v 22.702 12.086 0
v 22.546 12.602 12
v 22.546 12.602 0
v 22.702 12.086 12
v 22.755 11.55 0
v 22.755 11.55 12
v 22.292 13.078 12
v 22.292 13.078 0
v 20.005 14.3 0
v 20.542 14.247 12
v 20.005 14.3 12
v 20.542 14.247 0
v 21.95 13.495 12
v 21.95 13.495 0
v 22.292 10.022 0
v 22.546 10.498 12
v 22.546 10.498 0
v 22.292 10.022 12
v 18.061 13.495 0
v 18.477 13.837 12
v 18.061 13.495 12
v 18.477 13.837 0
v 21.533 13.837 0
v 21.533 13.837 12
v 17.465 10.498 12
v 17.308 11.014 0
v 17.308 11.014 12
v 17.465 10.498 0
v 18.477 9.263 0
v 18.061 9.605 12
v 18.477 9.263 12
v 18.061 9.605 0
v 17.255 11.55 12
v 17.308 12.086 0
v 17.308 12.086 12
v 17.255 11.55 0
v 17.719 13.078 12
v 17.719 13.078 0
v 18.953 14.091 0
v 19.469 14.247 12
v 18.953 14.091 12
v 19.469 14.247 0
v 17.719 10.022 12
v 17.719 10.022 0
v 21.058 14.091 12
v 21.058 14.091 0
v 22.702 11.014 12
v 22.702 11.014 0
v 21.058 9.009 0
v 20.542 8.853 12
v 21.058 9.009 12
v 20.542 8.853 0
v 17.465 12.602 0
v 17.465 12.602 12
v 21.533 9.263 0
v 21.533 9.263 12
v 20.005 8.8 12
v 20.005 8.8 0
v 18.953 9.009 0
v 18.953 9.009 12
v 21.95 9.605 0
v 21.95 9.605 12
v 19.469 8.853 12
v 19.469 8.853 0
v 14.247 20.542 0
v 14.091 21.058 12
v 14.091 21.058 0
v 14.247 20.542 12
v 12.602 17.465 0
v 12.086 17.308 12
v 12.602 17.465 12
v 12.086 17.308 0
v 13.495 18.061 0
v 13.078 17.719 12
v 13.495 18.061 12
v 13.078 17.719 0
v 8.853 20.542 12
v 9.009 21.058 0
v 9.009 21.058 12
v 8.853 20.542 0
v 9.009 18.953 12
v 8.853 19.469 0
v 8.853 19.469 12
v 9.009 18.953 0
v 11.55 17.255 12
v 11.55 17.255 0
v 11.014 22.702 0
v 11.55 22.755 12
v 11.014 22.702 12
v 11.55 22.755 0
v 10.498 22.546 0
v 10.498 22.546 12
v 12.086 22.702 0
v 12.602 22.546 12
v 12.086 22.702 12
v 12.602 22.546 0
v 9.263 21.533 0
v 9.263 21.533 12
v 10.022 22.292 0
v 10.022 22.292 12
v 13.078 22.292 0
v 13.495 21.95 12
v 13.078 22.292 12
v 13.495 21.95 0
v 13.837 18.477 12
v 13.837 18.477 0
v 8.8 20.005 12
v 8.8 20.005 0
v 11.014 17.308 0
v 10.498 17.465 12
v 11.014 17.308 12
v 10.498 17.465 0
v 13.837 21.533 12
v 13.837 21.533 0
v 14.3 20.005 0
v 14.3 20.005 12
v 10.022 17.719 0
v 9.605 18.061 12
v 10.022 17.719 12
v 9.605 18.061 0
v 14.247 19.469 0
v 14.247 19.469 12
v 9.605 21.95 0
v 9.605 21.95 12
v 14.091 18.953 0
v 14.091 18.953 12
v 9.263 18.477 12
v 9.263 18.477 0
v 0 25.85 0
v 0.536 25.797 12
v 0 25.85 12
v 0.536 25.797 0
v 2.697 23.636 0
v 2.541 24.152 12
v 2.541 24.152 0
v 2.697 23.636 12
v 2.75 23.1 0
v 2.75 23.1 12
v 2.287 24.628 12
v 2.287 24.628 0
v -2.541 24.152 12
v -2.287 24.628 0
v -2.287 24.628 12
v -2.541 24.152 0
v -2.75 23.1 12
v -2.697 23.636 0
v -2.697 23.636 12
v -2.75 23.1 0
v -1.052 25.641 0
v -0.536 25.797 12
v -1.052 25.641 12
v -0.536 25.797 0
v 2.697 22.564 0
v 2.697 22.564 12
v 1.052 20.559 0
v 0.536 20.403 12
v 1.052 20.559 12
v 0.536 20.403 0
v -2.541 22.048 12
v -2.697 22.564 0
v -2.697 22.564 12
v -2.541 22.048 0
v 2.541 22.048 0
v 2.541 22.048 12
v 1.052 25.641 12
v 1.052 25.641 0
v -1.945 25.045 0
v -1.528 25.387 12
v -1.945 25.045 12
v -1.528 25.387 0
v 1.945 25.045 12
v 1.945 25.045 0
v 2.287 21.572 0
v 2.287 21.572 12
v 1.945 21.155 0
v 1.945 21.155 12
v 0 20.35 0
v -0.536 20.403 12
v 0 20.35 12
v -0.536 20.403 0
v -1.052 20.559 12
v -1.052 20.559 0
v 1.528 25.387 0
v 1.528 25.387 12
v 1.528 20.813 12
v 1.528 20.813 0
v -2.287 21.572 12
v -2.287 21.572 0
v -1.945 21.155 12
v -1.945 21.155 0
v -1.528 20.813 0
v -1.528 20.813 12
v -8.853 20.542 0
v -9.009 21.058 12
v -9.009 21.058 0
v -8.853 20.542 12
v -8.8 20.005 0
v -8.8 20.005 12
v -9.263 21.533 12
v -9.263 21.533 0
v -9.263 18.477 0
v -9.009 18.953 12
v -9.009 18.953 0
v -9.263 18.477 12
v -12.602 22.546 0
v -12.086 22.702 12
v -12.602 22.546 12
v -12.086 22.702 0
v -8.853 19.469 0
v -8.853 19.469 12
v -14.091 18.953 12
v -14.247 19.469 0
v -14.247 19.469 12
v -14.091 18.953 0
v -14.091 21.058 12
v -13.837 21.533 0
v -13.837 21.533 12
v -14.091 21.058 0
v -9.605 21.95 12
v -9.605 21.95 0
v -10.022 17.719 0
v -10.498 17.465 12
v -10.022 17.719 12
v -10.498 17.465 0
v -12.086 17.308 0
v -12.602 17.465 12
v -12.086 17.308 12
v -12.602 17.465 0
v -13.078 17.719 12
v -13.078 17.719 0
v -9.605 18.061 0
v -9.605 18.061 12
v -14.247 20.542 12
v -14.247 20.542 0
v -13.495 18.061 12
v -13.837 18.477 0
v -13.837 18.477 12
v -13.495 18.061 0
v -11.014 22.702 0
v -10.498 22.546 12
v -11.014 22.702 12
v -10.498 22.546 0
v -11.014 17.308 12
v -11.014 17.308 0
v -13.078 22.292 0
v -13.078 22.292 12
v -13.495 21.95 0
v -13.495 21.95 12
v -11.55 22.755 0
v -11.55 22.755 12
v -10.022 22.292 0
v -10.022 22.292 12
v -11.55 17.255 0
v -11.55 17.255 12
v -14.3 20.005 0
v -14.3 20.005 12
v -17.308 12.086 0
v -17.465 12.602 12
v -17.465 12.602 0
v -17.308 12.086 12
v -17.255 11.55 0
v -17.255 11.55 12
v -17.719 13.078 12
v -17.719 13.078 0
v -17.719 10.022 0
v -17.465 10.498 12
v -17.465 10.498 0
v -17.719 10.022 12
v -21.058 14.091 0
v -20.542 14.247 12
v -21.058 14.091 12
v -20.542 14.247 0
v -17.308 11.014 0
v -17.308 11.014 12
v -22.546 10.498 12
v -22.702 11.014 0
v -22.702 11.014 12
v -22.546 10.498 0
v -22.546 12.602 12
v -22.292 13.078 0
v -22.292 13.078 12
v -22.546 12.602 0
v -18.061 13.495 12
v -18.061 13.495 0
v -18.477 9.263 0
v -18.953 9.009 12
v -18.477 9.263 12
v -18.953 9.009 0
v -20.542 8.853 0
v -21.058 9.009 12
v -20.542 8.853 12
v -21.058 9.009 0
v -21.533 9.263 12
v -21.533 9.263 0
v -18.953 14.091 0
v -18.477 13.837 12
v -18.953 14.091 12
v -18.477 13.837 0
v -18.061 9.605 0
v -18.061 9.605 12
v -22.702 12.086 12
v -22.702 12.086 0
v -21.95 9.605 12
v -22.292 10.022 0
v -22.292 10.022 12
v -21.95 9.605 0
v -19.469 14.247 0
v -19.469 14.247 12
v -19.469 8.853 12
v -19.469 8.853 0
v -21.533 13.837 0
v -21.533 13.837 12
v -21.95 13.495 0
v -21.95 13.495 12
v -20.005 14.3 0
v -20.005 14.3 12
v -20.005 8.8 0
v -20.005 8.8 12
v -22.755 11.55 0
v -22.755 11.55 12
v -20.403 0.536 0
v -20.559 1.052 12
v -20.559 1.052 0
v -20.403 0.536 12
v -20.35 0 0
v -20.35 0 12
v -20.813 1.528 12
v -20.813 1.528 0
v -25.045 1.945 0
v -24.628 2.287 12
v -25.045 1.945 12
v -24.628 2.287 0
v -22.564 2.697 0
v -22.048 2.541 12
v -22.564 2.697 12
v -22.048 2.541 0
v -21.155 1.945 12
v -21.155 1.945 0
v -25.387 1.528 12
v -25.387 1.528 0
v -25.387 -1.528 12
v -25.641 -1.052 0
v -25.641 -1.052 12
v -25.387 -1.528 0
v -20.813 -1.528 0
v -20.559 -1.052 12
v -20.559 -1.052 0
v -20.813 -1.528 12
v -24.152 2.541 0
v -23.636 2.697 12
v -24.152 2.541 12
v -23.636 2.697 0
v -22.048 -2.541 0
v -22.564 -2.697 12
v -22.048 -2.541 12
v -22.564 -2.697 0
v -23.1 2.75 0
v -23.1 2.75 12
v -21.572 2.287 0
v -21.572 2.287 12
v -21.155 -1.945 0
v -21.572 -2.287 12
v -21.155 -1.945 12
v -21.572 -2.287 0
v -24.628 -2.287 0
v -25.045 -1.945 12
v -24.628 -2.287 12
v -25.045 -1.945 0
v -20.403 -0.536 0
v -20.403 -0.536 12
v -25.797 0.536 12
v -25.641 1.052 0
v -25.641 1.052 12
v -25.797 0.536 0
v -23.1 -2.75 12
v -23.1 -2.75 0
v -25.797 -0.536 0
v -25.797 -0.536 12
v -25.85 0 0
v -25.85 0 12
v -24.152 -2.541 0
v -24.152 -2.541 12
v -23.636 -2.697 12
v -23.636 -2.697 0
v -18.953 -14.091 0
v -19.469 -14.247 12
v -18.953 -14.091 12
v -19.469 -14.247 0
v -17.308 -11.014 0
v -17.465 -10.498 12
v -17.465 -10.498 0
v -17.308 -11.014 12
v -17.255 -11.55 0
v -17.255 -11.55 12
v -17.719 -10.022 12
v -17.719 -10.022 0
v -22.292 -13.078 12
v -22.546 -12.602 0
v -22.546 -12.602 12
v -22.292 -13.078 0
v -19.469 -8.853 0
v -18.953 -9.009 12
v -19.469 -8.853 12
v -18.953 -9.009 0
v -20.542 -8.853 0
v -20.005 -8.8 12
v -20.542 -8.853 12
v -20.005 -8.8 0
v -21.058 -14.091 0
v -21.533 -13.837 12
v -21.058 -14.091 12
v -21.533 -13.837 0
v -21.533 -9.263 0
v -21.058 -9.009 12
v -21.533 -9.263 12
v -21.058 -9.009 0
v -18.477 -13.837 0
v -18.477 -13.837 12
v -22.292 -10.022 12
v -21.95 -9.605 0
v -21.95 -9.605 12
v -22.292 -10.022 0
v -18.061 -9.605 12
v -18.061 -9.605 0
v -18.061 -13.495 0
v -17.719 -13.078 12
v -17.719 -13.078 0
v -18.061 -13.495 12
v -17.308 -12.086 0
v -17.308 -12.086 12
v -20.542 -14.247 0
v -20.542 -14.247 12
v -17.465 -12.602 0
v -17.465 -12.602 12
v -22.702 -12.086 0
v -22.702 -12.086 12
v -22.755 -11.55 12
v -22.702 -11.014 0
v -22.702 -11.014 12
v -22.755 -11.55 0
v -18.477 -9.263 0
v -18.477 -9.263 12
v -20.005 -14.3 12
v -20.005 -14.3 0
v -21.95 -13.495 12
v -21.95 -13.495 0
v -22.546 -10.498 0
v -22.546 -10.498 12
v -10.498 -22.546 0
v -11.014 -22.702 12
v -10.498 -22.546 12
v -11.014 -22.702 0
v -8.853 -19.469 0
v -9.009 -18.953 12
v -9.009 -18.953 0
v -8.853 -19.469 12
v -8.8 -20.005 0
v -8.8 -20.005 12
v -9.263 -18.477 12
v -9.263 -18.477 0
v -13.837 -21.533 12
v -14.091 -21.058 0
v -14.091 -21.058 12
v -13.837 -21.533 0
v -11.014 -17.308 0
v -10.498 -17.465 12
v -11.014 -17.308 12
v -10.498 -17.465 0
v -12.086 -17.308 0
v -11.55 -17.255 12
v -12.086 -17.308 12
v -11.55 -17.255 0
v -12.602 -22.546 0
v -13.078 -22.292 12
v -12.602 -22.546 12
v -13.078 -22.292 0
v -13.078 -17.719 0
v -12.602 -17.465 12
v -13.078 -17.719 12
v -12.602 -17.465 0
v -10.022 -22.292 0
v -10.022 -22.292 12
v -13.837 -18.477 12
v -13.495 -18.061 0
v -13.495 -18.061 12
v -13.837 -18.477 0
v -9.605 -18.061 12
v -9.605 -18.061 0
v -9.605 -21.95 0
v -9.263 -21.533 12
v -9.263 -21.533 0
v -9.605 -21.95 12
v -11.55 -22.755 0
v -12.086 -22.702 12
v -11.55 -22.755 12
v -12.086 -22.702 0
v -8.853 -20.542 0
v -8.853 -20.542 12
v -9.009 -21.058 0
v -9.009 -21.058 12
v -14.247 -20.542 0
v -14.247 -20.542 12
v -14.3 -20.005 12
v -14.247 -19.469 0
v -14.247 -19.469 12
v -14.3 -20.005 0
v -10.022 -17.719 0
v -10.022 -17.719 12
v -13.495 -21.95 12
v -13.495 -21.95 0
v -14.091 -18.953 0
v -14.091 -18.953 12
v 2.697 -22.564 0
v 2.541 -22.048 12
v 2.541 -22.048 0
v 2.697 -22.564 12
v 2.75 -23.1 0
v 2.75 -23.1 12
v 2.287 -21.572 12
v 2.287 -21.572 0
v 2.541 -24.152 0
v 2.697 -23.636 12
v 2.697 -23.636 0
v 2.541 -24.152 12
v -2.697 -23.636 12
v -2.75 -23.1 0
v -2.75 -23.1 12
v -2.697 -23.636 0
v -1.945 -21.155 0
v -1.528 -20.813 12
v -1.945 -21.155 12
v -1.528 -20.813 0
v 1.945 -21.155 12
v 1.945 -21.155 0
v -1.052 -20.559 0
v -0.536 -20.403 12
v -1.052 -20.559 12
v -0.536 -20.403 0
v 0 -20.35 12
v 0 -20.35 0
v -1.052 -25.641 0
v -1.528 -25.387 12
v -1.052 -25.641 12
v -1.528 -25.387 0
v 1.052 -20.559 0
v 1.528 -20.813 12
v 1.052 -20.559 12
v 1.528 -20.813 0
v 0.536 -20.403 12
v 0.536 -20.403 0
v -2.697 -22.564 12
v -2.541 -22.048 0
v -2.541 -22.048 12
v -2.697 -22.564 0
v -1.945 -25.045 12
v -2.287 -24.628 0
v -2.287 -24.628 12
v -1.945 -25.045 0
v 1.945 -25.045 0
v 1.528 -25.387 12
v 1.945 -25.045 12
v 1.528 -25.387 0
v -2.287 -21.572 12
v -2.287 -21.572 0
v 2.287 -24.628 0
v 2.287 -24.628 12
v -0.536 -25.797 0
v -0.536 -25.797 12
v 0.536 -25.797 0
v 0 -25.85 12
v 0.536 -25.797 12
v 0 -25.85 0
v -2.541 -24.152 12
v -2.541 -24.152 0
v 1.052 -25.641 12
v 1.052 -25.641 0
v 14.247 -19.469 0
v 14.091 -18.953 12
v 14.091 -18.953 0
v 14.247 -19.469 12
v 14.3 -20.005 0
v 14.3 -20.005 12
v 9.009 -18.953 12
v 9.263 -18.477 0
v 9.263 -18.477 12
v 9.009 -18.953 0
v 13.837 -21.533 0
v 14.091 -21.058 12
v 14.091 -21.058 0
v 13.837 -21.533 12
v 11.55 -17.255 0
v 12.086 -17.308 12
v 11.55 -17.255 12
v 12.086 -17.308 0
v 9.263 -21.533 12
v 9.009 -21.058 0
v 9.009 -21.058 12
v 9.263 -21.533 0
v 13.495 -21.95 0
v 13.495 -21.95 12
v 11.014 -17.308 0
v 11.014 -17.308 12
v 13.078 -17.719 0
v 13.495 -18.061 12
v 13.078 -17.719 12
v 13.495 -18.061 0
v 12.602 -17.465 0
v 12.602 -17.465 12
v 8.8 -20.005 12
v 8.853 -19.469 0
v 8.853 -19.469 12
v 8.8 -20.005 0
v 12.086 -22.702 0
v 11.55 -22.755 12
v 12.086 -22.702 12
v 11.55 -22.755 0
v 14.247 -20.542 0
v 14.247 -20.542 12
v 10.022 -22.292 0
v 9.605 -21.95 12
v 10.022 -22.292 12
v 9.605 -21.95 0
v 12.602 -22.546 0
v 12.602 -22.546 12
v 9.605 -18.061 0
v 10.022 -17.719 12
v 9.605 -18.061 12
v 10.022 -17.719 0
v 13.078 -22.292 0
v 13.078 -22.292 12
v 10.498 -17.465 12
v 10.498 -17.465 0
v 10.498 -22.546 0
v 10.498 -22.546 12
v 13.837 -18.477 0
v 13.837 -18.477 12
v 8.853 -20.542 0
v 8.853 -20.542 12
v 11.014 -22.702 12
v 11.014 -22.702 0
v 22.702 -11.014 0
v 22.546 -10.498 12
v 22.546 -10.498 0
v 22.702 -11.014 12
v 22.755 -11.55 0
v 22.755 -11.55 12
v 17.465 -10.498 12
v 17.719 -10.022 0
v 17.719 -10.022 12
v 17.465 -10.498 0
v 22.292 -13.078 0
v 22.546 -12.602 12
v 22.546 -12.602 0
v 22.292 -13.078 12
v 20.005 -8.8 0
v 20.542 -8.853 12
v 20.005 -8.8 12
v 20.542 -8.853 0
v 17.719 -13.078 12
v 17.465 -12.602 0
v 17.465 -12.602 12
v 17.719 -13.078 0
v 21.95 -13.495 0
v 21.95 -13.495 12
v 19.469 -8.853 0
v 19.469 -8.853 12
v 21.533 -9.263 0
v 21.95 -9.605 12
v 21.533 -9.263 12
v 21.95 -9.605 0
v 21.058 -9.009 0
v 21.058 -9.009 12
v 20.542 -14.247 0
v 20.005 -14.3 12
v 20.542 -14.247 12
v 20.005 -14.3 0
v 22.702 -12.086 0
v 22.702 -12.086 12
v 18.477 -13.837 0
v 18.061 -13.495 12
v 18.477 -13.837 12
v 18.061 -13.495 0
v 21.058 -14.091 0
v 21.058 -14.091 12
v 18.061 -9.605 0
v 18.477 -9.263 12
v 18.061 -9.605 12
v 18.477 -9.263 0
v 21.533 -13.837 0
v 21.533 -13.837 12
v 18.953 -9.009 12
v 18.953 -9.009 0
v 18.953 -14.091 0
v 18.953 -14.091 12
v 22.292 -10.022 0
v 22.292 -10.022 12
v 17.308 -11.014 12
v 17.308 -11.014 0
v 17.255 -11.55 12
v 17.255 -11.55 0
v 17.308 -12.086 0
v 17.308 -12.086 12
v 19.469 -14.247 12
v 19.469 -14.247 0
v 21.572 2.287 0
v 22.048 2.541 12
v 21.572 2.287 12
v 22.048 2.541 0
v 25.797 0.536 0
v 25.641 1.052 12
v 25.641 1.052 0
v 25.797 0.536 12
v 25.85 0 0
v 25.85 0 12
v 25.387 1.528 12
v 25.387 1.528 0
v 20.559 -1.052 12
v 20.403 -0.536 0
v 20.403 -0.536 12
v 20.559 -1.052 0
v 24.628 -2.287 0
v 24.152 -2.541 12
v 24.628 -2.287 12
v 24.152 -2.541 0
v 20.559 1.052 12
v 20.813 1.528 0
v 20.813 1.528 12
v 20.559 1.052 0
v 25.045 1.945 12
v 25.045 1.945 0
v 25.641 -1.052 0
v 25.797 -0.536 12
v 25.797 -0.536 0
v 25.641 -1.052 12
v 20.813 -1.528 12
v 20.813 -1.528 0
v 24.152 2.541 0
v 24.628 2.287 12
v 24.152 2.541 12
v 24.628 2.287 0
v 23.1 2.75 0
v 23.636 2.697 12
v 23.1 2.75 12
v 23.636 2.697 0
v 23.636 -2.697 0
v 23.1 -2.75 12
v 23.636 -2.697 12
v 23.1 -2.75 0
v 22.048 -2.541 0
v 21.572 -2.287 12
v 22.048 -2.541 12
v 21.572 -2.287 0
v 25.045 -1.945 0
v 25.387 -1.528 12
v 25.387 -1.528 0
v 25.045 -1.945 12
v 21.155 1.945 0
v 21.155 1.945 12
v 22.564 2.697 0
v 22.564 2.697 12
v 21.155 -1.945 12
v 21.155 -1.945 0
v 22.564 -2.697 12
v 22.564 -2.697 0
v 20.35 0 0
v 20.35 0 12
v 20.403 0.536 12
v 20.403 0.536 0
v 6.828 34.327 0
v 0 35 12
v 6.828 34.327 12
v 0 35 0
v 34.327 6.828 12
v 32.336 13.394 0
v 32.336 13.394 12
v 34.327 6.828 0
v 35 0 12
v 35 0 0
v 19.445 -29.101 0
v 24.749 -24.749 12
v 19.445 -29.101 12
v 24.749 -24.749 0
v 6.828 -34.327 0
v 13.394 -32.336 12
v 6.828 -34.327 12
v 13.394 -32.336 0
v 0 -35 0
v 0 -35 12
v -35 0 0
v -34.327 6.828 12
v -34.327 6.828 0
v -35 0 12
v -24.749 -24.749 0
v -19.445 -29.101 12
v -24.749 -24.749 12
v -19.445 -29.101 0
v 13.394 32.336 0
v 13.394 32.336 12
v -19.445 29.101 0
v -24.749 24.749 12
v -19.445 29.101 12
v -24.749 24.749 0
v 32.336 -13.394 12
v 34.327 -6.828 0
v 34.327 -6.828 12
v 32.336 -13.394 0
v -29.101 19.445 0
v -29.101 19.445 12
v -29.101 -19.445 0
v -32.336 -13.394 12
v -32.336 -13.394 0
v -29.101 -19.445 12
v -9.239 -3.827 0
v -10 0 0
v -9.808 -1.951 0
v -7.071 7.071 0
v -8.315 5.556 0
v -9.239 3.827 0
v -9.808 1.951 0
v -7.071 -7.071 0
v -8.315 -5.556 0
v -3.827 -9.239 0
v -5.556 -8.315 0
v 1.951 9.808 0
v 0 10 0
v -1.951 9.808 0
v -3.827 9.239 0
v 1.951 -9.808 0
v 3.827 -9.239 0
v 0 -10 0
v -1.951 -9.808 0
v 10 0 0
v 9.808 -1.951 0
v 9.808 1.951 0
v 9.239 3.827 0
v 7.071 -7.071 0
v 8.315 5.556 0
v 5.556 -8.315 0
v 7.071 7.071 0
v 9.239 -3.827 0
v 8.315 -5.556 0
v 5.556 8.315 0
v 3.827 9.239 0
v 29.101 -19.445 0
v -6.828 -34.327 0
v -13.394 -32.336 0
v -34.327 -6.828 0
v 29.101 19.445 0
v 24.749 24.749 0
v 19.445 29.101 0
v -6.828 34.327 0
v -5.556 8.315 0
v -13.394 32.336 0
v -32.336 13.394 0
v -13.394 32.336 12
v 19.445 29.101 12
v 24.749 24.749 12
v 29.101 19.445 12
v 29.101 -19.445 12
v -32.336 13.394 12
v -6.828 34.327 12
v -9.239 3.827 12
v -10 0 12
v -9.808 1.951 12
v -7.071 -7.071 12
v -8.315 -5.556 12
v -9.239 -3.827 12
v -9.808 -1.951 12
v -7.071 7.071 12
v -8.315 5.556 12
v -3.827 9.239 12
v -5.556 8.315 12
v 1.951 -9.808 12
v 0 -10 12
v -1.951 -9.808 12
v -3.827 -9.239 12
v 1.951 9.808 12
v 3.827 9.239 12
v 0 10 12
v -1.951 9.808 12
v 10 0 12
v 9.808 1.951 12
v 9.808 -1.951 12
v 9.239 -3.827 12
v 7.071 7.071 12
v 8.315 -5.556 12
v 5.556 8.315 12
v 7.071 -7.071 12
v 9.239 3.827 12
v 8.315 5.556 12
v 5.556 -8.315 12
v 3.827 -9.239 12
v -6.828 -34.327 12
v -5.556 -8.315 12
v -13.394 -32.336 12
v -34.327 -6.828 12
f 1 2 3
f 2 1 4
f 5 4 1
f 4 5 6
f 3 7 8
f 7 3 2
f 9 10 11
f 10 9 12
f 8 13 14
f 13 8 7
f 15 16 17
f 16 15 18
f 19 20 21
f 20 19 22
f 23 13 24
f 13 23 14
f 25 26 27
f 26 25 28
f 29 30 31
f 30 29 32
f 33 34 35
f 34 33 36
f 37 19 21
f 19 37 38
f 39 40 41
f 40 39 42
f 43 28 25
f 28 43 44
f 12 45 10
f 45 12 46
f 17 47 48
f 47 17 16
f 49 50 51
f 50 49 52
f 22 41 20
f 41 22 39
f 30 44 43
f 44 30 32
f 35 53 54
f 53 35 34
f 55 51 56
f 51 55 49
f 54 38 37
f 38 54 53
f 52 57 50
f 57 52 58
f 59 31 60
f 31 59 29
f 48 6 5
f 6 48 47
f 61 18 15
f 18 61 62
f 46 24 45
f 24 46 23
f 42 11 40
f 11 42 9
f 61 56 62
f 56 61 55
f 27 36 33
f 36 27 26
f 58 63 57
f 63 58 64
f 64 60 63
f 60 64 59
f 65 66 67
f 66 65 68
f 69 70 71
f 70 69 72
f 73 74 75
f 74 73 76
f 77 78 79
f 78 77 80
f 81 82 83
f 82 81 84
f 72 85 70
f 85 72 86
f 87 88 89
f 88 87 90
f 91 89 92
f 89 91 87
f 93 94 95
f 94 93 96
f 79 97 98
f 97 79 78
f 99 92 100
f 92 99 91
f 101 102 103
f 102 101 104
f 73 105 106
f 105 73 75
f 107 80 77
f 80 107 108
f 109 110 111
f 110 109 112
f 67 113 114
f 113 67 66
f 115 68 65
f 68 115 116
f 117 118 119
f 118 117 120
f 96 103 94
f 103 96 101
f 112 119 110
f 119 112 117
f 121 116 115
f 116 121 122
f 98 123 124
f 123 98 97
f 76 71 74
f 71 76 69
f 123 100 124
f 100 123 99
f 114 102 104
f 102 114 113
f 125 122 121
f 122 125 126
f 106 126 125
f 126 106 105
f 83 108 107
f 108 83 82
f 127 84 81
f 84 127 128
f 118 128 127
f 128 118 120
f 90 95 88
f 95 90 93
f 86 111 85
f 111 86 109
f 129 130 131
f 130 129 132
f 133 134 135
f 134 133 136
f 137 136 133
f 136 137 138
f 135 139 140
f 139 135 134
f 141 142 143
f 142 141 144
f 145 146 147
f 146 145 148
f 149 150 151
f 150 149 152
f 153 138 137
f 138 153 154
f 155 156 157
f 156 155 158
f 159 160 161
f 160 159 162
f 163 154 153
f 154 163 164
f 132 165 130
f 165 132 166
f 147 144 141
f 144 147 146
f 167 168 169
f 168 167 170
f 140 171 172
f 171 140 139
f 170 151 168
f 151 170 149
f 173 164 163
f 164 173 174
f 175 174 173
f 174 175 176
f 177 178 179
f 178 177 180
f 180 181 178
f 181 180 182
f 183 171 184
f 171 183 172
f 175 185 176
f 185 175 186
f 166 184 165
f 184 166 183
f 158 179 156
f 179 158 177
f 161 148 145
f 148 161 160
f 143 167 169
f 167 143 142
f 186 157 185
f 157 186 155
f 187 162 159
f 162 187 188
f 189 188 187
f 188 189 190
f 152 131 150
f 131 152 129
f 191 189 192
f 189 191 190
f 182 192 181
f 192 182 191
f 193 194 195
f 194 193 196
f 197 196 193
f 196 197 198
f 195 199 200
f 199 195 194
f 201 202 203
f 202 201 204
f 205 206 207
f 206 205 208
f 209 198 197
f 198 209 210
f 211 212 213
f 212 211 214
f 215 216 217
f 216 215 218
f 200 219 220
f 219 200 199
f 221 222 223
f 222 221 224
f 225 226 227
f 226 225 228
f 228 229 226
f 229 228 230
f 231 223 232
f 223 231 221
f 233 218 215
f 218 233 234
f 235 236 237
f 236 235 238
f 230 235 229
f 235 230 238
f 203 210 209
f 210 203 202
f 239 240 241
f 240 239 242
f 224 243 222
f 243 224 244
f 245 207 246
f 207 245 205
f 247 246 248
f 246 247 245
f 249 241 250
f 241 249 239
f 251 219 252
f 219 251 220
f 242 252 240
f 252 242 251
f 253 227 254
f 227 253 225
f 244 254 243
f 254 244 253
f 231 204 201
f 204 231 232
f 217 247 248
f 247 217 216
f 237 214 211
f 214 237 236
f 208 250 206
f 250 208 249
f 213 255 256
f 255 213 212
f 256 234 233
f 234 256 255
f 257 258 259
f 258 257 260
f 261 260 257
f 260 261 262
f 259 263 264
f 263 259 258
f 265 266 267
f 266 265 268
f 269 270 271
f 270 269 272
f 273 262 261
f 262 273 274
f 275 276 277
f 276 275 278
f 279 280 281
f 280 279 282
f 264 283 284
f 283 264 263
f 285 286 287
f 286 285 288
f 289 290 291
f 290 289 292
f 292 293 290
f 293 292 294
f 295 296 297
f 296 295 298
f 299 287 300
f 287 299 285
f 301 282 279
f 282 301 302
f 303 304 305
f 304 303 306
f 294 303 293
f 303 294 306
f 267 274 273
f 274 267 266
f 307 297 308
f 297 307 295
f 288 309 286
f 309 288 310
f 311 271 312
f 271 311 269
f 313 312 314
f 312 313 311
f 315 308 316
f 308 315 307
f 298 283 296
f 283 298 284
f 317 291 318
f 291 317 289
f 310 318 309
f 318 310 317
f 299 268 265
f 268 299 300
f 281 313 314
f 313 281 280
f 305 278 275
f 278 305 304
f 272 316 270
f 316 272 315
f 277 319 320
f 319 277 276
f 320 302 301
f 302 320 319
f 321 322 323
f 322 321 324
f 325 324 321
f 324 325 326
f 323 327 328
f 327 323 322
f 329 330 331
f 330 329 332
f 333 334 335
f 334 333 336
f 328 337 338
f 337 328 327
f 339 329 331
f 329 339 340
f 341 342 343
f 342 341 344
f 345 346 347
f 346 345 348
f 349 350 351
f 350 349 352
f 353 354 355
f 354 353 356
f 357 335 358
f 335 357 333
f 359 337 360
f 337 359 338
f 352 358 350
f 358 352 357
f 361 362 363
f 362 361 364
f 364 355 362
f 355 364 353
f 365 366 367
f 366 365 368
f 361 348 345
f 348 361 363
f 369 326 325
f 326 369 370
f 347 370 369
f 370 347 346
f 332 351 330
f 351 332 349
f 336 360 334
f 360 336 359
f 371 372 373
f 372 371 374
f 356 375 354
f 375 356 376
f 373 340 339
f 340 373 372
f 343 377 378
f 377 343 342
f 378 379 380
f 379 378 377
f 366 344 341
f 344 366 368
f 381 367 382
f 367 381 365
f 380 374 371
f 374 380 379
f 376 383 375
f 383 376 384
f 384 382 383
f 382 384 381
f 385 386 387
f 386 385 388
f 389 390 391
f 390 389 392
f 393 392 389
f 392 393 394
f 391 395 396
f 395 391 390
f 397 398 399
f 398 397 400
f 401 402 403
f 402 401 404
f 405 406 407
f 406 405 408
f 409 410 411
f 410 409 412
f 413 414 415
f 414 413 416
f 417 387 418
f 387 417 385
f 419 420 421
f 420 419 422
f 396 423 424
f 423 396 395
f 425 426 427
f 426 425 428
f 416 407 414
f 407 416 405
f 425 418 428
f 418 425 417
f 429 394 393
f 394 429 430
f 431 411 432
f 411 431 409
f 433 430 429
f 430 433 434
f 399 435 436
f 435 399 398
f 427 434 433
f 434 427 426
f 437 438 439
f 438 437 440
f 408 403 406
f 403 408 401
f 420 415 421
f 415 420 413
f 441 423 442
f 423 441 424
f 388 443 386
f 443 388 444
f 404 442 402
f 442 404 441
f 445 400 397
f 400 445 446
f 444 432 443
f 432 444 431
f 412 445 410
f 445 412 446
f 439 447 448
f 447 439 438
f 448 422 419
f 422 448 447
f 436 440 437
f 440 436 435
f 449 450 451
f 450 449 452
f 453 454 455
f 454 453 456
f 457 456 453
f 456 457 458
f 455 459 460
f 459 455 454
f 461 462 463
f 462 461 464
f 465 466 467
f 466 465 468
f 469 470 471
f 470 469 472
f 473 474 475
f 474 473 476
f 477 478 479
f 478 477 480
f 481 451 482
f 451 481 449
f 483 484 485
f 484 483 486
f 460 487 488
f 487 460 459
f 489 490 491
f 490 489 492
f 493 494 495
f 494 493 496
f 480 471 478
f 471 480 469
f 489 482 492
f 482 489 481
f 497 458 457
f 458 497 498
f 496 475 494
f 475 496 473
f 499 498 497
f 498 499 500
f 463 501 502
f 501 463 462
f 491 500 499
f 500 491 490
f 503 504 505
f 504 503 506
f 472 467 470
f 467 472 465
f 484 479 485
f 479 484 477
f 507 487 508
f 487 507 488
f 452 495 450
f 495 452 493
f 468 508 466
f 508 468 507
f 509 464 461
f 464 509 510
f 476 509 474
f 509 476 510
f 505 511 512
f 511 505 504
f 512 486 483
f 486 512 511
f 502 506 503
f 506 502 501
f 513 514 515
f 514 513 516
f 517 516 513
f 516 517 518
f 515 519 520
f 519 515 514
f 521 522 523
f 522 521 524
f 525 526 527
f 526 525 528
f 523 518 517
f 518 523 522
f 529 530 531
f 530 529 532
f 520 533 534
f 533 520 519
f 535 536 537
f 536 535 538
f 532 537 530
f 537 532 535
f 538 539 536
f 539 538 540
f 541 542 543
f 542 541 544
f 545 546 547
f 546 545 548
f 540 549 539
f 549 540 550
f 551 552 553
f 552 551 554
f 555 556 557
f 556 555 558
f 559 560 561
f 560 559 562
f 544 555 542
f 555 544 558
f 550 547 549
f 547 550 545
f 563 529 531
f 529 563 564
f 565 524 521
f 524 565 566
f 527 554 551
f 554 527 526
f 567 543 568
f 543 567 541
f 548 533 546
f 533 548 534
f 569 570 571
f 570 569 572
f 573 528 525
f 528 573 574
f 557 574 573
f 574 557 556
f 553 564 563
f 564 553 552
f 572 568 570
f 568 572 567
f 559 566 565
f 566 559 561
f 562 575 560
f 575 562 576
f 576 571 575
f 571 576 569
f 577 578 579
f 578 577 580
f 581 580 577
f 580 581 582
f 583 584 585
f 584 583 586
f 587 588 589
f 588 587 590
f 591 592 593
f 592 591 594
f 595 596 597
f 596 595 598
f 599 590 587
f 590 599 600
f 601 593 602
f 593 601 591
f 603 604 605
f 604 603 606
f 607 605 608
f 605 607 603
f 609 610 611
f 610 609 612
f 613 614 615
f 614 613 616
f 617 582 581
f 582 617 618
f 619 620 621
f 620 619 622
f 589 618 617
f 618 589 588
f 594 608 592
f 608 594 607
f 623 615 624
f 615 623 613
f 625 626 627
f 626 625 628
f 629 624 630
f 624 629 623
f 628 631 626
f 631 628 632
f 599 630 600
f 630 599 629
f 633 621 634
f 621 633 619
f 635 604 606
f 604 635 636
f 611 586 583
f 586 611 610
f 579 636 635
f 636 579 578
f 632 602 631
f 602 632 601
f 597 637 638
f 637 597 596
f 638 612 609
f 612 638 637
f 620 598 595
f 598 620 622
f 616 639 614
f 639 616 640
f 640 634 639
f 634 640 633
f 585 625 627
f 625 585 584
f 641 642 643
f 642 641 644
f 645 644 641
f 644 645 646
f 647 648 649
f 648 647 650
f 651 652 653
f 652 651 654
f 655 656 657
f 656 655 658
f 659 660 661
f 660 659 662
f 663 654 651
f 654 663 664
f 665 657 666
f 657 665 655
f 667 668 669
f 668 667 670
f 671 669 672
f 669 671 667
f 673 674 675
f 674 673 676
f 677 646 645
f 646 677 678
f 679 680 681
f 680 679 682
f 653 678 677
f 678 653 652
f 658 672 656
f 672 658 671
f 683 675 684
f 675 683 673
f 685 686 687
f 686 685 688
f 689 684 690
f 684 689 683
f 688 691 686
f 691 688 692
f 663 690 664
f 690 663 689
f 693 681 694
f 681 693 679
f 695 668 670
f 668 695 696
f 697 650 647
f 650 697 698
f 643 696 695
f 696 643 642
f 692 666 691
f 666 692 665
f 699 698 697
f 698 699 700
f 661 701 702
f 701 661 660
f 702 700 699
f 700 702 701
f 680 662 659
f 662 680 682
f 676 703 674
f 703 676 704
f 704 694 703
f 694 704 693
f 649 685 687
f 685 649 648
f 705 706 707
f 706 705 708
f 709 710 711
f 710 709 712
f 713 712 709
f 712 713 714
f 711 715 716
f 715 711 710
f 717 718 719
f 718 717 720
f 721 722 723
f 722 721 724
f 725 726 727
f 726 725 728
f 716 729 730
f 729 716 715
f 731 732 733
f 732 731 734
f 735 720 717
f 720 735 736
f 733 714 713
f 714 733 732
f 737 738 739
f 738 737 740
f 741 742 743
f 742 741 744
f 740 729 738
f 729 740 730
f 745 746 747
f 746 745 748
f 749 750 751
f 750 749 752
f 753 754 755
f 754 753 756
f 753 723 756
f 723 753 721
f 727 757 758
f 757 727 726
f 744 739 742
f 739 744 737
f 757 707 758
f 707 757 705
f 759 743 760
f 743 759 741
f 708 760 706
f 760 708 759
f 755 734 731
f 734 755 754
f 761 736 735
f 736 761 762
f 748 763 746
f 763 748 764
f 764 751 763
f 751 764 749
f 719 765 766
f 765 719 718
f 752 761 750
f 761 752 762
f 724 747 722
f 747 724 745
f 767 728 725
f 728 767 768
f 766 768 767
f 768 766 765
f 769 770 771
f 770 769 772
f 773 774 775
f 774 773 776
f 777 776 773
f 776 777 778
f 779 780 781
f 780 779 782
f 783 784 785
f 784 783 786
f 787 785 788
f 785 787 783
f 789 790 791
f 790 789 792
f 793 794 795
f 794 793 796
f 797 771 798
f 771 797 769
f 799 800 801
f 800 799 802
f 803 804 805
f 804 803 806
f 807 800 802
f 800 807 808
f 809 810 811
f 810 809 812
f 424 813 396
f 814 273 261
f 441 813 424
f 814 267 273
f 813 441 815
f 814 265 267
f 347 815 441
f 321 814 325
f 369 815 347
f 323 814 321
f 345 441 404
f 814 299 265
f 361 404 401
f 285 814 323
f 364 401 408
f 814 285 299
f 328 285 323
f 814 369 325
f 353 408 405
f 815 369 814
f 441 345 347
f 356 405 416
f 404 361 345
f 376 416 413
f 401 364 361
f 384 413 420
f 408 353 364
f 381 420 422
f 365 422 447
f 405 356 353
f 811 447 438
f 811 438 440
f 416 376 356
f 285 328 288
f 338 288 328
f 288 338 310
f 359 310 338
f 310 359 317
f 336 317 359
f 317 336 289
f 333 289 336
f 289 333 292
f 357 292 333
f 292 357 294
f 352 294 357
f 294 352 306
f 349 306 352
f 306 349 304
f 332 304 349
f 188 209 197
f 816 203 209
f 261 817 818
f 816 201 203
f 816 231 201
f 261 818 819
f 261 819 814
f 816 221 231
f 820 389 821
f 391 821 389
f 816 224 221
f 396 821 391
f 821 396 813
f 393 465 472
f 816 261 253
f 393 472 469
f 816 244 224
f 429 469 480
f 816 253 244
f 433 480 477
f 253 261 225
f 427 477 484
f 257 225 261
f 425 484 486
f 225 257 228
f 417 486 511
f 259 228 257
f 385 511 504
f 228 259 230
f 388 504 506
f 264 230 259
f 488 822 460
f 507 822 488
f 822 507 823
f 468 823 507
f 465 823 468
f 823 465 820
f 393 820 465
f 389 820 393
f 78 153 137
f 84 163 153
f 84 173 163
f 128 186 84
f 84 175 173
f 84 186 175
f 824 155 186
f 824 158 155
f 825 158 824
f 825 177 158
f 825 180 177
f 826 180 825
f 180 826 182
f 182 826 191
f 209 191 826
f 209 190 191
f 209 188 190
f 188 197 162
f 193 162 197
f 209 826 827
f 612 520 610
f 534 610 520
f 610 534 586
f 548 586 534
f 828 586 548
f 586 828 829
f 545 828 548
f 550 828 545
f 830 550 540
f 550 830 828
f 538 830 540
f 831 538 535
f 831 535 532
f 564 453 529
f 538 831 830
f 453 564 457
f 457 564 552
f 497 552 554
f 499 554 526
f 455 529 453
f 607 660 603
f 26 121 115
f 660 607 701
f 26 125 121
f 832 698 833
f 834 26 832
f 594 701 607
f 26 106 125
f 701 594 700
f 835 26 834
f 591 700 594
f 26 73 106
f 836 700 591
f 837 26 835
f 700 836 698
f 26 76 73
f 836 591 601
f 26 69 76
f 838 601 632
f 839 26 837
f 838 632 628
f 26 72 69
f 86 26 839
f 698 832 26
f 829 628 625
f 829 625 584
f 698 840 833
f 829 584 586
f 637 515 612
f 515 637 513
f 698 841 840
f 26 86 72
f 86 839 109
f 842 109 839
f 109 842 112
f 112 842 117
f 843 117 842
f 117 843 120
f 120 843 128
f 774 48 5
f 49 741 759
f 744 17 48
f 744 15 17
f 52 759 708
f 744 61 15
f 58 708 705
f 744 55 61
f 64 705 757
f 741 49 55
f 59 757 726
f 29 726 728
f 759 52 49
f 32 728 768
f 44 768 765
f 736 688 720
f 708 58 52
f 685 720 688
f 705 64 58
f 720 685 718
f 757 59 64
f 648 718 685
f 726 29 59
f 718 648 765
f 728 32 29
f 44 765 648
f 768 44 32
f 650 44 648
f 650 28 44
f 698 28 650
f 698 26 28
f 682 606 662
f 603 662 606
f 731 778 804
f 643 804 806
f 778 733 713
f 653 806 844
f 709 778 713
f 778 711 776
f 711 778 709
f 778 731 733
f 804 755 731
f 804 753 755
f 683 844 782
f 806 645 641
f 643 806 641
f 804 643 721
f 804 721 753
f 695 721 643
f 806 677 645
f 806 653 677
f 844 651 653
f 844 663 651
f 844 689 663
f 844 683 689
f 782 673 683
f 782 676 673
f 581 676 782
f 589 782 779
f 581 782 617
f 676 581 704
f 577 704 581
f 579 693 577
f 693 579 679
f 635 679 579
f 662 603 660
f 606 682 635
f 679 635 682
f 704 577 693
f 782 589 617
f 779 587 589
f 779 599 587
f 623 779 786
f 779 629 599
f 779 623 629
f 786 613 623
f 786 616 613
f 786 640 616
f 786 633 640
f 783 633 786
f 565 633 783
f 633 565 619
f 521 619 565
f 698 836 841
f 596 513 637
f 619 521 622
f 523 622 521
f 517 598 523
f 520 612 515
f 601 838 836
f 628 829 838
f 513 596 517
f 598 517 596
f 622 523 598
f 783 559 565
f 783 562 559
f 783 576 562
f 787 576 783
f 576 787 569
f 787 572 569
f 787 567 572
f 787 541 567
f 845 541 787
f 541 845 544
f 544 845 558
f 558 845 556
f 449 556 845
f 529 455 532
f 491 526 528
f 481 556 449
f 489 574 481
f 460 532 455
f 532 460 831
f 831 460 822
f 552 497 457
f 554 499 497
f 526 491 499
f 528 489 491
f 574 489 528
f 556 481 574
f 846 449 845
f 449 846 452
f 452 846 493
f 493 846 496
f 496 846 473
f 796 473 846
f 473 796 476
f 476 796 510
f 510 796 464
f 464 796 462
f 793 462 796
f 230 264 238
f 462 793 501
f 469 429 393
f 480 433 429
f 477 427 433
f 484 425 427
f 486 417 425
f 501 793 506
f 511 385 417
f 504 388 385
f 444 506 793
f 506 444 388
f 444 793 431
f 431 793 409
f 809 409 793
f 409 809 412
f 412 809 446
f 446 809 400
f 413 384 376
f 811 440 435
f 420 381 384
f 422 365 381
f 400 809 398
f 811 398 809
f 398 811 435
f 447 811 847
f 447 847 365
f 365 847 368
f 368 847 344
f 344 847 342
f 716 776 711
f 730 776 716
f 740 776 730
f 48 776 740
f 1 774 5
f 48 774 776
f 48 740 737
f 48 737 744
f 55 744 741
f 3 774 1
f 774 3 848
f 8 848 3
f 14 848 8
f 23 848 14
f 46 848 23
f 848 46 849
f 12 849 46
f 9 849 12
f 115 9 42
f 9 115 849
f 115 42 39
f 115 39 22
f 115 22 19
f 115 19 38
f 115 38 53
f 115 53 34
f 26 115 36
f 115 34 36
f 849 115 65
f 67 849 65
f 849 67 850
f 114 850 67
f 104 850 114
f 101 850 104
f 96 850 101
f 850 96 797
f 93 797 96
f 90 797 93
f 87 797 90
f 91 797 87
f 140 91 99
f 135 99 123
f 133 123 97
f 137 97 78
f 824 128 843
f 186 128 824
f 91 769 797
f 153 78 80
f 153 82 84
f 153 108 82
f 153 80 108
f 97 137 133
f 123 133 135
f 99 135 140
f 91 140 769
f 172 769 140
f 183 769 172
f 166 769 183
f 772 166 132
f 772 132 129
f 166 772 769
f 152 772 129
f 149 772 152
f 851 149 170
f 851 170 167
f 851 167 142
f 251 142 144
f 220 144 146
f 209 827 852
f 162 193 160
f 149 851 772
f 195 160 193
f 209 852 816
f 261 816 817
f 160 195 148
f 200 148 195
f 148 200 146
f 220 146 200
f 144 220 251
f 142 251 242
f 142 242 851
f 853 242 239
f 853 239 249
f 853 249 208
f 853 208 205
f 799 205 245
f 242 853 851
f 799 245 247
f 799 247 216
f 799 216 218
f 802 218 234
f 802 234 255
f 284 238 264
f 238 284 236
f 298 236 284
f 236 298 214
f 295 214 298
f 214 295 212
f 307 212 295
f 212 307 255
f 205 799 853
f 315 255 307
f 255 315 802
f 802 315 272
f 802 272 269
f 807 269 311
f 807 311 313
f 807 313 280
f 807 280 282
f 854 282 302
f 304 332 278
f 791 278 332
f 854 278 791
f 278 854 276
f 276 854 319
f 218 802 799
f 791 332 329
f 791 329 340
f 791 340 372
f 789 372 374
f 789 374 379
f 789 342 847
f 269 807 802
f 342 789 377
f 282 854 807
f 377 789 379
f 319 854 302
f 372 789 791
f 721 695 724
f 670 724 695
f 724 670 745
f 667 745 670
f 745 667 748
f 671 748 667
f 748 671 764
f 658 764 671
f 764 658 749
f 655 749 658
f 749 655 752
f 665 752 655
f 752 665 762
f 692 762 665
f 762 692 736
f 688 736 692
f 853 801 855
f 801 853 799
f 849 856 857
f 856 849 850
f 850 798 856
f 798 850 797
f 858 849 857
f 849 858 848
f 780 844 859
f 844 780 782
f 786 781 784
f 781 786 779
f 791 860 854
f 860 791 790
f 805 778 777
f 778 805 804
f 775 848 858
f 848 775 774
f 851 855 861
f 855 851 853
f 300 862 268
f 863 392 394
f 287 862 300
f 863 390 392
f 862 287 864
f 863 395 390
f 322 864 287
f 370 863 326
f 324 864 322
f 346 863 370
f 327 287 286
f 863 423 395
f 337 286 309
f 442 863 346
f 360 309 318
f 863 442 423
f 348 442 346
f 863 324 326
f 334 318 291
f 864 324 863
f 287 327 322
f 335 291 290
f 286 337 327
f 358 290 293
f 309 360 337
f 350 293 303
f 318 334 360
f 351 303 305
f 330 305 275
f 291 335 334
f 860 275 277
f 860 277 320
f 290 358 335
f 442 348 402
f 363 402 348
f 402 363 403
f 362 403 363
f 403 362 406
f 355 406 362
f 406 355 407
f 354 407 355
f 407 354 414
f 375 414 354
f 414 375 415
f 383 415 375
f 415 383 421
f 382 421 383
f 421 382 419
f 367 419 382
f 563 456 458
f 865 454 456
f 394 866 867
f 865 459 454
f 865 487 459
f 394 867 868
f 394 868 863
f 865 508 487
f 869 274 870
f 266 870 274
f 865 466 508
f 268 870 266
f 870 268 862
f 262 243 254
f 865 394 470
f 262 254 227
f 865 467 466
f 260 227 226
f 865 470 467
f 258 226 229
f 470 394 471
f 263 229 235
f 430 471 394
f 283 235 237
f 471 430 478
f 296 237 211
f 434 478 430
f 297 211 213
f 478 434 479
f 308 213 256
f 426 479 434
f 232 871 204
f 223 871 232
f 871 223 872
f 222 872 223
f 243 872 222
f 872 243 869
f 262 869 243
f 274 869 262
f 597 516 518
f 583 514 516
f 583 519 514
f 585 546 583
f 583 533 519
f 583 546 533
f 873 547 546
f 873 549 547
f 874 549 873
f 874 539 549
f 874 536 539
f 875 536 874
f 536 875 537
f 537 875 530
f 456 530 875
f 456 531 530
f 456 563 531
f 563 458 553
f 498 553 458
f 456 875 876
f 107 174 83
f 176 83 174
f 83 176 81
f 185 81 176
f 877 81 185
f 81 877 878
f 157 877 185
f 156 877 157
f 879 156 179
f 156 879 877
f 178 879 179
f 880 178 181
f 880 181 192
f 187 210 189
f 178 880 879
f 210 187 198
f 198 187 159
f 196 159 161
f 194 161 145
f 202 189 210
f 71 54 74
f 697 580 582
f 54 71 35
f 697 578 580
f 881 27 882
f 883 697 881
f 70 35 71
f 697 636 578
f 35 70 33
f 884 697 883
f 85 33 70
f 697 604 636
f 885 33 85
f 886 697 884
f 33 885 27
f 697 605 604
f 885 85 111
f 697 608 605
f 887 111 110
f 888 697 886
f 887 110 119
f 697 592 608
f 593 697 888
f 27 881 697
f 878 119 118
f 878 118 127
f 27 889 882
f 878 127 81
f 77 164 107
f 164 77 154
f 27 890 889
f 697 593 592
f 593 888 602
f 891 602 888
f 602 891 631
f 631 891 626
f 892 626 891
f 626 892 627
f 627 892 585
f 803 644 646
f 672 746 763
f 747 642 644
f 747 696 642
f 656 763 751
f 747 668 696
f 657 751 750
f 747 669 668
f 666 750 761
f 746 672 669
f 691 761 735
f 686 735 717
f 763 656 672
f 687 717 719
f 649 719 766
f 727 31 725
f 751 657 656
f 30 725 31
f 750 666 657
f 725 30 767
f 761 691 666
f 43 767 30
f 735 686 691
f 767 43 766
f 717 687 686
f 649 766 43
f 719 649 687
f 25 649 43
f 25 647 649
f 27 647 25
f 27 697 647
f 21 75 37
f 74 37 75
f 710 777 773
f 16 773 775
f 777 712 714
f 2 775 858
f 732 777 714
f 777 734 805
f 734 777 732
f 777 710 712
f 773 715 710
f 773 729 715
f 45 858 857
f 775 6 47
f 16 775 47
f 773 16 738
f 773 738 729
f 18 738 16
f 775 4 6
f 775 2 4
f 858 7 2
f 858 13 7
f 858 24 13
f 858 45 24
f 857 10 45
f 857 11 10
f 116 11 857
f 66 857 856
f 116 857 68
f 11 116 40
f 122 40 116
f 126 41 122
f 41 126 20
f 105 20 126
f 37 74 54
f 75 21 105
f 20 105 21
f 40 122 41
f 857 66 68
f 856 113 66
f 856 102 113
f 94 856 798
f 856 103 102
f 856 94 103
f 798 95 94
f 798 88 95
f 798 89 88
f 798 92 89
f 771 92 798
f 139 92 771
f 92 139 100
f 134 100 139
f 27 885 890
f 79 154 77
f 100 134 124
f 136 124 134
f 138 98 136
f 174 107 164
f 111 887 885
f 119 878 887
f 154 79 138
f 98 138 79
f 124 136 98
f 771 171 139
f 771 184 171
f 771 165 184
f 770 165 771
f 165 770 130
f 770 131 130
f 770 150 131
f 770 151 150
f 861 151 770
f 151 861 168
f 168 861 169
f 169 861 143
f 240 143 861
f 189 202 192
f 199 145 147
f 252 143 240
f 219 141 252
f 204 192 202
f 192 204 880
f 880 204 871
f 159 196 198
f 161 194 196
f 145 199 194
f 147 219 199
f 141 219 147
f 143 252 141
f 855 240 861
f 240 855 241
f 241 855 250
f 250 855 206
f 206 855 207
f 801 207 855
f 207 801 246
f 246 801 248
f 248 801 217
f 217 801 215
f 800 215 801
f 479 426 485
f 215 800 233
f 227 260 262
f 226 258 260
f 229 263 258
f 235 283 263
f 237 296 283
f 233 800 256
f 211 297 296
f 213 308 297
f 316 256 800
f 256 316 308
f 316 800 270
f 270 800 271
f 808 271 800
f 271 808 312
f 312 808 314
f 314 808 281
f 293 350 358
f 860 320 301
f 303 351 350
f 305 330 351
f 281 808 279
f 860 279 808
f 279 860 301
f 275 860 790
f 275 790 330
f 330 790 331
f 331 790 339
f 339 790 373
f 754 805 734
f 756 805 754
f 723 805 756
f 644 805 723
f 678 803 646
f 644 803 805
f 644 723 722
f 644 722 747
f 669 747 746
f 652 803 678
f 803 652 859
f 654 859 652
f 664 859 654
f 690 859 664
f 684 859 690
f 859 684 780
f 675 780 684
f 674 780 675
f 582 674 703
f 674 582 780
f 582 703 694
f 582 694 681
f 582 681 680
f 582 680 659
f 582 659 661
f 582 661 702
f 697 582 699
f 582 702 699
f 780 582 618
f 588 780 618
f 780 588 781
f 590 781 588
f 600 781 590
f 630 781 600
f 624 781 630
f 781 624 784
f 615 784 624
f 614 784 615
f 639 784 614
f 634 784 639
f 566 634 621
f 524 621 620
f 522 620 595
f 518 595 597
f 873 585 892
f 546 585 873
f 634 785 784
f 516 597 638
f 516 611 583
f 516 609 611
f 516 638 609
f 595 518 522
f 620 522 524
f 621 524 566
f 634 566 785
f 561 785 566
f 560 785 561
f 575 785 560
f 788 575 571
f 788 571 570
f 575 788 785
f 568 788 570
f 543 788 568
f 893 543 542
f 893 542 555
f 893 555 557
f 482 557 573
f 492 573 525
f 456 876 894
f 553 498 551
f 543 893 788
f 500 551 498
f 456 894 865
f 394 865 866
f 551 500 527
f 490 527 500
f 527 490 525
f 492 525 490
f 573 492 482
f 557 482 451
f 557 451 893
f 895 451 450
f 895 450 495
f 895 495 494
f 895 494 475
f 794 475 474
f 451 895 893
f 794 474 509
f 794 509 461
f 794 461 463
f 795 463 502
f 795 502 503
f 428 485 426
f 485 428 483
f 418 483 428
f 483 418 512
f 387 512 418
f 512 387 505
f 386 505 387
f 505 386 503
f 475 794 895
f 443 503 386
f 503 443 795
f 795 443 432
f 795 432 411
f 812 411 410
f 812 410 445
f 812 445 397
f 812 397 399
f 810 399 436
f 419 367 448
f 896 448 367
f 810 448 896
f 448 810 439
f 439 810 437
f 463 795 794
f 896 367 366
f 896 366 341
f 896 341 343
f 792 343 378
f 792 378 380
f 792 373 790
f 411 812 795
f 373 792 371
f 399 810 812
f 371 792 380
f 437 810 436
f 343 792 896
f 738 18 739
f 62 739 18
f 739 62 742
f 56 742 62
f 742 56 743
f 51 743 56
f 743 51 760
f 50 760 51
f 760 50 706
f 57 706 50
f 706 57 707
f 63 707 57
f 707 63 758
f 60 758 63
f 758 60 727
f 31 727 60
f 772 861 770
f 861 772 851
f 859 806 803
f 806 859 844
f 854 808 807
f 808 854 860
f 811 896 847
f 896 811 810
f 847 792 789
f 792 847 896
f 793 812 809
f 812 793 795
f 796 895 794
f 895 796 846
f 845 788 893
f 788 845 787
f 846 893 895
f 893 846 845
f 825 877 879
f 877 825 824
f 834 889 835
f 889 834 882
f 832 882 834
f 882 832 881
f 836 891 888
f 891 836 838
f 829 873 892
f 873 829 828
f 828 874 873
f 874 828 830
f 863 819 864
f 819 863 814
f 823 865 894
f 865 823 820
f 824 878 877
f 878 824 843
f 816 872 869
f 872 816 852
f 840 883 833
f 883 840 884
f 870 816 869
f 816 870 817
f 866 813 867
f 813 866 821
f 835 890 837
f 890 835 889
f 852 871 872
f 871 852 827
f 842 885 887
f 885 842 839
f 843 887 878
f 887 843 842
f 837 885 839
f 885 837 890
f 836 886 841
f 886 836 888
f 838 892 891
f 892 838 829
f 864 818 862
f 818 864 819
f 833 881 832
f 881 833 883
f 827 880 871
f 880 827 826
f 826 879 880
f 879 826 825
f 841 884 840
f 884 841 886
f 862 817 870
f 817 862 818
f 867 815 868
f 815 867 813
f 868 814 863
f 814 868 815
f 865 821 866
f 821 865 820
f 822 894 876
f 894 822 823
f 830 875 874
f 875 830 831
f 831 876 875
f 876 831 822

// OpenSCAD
$fn = 32;

// ----------------------------------------------------------------------
// Flange Ø70 x 12
// 12 holes on a Ø46.2 bolt circle, bolted joints
// ----------------------------------------------------------------------

// --- parameters (mm) ---
flange_d = 70;   // outside diameter of the flange
thickness = 12;  // flange thickness
holes = 12;      // number of bolt holes
pcd = 46.2;      // bolt circle diameter
start_deg = 30;  // angle of the first hole, from +X
hole_d = 5.5;    // bolt hole diameter
bore_d = 20;     // central through bore
hub_d = 30;      // hub outside diameter
hub_h = 0;       // hub height above the flange face (0 = no hub)

// --- derived feature positions (mm) ---
height = thickness + hub_h;  // = 12   overall height of the part
pcd_r = pcd / 2;             // = 23.1   bolt circle radius
hole_step = 360 / holes;     // = 30   angular pitch
feature_centers = [
  [pcd_r * cos(start_deg + 0 * hole_step), pcd_r * sin(start_deg + 0 * hole_step)],
  [pcd_r * cos(start_deg + 1 * hole_step), pcd_r * sin(start_deg + 1 * hole_step)],
  [pcd_r * cos(start_deg + 2 * hole_step), pcd_r * sin(start_deg + 2 * hole_step)],
  [pcd_r * cos(start_deg + 3 * hole_step), pcd_r * sin(start_deg + 3 * hole_step)],
  [pcd_r * cos(start_deg + 4 * hole_step), pcd_r * sin(start_deg + 4 * hole_step)],
  [pcd_r * cos(start_deg + 5 * hole_step), pcd_r * sin(start_deg + 5 * hole_step)],
  [pcd_r * cos(start_deg + 6 * hole_step), pcd_r * sin(start_deg + 6 * hole_step)],
  [pcd_r * cos(start_deg + 7 * hole_step), pcd_r * sin(start_deg + 7 * hole_step)],
  [pcd_r * cos(start_deg + 8 * hole_step), pcd_r * sin(start_deg + 8 * hole_step)],
  [pcd_r * cos(start_deg + 9 * hole_step), pcd_r * sin(start_deg + 9 * hole_step)],
  [pcd_r * cos(start_deg + 10 * hole_step), pcd_r * sin(start_deg + 10 * hole_step)],
  [pcd_r * cos(start_deg + 11 * hole_step), pcd_r * sin(start_deg + 11 * hole_step)]
];   // bolt hole centres on the pitch circle

// flange disc, every hole and the bore cut straight through
difference() {
  union() {
    cylinder(d = flange_d, h = thickness);
  }
  translate([0, 0, -1]) cylinder(d = bore_d, h = height + 2);  // bore, through
  for (centre = feature_centers)
    translate([centre[0], centre[1], -1]) cylinder(d = hole_d, h = thickness + 2);
}
